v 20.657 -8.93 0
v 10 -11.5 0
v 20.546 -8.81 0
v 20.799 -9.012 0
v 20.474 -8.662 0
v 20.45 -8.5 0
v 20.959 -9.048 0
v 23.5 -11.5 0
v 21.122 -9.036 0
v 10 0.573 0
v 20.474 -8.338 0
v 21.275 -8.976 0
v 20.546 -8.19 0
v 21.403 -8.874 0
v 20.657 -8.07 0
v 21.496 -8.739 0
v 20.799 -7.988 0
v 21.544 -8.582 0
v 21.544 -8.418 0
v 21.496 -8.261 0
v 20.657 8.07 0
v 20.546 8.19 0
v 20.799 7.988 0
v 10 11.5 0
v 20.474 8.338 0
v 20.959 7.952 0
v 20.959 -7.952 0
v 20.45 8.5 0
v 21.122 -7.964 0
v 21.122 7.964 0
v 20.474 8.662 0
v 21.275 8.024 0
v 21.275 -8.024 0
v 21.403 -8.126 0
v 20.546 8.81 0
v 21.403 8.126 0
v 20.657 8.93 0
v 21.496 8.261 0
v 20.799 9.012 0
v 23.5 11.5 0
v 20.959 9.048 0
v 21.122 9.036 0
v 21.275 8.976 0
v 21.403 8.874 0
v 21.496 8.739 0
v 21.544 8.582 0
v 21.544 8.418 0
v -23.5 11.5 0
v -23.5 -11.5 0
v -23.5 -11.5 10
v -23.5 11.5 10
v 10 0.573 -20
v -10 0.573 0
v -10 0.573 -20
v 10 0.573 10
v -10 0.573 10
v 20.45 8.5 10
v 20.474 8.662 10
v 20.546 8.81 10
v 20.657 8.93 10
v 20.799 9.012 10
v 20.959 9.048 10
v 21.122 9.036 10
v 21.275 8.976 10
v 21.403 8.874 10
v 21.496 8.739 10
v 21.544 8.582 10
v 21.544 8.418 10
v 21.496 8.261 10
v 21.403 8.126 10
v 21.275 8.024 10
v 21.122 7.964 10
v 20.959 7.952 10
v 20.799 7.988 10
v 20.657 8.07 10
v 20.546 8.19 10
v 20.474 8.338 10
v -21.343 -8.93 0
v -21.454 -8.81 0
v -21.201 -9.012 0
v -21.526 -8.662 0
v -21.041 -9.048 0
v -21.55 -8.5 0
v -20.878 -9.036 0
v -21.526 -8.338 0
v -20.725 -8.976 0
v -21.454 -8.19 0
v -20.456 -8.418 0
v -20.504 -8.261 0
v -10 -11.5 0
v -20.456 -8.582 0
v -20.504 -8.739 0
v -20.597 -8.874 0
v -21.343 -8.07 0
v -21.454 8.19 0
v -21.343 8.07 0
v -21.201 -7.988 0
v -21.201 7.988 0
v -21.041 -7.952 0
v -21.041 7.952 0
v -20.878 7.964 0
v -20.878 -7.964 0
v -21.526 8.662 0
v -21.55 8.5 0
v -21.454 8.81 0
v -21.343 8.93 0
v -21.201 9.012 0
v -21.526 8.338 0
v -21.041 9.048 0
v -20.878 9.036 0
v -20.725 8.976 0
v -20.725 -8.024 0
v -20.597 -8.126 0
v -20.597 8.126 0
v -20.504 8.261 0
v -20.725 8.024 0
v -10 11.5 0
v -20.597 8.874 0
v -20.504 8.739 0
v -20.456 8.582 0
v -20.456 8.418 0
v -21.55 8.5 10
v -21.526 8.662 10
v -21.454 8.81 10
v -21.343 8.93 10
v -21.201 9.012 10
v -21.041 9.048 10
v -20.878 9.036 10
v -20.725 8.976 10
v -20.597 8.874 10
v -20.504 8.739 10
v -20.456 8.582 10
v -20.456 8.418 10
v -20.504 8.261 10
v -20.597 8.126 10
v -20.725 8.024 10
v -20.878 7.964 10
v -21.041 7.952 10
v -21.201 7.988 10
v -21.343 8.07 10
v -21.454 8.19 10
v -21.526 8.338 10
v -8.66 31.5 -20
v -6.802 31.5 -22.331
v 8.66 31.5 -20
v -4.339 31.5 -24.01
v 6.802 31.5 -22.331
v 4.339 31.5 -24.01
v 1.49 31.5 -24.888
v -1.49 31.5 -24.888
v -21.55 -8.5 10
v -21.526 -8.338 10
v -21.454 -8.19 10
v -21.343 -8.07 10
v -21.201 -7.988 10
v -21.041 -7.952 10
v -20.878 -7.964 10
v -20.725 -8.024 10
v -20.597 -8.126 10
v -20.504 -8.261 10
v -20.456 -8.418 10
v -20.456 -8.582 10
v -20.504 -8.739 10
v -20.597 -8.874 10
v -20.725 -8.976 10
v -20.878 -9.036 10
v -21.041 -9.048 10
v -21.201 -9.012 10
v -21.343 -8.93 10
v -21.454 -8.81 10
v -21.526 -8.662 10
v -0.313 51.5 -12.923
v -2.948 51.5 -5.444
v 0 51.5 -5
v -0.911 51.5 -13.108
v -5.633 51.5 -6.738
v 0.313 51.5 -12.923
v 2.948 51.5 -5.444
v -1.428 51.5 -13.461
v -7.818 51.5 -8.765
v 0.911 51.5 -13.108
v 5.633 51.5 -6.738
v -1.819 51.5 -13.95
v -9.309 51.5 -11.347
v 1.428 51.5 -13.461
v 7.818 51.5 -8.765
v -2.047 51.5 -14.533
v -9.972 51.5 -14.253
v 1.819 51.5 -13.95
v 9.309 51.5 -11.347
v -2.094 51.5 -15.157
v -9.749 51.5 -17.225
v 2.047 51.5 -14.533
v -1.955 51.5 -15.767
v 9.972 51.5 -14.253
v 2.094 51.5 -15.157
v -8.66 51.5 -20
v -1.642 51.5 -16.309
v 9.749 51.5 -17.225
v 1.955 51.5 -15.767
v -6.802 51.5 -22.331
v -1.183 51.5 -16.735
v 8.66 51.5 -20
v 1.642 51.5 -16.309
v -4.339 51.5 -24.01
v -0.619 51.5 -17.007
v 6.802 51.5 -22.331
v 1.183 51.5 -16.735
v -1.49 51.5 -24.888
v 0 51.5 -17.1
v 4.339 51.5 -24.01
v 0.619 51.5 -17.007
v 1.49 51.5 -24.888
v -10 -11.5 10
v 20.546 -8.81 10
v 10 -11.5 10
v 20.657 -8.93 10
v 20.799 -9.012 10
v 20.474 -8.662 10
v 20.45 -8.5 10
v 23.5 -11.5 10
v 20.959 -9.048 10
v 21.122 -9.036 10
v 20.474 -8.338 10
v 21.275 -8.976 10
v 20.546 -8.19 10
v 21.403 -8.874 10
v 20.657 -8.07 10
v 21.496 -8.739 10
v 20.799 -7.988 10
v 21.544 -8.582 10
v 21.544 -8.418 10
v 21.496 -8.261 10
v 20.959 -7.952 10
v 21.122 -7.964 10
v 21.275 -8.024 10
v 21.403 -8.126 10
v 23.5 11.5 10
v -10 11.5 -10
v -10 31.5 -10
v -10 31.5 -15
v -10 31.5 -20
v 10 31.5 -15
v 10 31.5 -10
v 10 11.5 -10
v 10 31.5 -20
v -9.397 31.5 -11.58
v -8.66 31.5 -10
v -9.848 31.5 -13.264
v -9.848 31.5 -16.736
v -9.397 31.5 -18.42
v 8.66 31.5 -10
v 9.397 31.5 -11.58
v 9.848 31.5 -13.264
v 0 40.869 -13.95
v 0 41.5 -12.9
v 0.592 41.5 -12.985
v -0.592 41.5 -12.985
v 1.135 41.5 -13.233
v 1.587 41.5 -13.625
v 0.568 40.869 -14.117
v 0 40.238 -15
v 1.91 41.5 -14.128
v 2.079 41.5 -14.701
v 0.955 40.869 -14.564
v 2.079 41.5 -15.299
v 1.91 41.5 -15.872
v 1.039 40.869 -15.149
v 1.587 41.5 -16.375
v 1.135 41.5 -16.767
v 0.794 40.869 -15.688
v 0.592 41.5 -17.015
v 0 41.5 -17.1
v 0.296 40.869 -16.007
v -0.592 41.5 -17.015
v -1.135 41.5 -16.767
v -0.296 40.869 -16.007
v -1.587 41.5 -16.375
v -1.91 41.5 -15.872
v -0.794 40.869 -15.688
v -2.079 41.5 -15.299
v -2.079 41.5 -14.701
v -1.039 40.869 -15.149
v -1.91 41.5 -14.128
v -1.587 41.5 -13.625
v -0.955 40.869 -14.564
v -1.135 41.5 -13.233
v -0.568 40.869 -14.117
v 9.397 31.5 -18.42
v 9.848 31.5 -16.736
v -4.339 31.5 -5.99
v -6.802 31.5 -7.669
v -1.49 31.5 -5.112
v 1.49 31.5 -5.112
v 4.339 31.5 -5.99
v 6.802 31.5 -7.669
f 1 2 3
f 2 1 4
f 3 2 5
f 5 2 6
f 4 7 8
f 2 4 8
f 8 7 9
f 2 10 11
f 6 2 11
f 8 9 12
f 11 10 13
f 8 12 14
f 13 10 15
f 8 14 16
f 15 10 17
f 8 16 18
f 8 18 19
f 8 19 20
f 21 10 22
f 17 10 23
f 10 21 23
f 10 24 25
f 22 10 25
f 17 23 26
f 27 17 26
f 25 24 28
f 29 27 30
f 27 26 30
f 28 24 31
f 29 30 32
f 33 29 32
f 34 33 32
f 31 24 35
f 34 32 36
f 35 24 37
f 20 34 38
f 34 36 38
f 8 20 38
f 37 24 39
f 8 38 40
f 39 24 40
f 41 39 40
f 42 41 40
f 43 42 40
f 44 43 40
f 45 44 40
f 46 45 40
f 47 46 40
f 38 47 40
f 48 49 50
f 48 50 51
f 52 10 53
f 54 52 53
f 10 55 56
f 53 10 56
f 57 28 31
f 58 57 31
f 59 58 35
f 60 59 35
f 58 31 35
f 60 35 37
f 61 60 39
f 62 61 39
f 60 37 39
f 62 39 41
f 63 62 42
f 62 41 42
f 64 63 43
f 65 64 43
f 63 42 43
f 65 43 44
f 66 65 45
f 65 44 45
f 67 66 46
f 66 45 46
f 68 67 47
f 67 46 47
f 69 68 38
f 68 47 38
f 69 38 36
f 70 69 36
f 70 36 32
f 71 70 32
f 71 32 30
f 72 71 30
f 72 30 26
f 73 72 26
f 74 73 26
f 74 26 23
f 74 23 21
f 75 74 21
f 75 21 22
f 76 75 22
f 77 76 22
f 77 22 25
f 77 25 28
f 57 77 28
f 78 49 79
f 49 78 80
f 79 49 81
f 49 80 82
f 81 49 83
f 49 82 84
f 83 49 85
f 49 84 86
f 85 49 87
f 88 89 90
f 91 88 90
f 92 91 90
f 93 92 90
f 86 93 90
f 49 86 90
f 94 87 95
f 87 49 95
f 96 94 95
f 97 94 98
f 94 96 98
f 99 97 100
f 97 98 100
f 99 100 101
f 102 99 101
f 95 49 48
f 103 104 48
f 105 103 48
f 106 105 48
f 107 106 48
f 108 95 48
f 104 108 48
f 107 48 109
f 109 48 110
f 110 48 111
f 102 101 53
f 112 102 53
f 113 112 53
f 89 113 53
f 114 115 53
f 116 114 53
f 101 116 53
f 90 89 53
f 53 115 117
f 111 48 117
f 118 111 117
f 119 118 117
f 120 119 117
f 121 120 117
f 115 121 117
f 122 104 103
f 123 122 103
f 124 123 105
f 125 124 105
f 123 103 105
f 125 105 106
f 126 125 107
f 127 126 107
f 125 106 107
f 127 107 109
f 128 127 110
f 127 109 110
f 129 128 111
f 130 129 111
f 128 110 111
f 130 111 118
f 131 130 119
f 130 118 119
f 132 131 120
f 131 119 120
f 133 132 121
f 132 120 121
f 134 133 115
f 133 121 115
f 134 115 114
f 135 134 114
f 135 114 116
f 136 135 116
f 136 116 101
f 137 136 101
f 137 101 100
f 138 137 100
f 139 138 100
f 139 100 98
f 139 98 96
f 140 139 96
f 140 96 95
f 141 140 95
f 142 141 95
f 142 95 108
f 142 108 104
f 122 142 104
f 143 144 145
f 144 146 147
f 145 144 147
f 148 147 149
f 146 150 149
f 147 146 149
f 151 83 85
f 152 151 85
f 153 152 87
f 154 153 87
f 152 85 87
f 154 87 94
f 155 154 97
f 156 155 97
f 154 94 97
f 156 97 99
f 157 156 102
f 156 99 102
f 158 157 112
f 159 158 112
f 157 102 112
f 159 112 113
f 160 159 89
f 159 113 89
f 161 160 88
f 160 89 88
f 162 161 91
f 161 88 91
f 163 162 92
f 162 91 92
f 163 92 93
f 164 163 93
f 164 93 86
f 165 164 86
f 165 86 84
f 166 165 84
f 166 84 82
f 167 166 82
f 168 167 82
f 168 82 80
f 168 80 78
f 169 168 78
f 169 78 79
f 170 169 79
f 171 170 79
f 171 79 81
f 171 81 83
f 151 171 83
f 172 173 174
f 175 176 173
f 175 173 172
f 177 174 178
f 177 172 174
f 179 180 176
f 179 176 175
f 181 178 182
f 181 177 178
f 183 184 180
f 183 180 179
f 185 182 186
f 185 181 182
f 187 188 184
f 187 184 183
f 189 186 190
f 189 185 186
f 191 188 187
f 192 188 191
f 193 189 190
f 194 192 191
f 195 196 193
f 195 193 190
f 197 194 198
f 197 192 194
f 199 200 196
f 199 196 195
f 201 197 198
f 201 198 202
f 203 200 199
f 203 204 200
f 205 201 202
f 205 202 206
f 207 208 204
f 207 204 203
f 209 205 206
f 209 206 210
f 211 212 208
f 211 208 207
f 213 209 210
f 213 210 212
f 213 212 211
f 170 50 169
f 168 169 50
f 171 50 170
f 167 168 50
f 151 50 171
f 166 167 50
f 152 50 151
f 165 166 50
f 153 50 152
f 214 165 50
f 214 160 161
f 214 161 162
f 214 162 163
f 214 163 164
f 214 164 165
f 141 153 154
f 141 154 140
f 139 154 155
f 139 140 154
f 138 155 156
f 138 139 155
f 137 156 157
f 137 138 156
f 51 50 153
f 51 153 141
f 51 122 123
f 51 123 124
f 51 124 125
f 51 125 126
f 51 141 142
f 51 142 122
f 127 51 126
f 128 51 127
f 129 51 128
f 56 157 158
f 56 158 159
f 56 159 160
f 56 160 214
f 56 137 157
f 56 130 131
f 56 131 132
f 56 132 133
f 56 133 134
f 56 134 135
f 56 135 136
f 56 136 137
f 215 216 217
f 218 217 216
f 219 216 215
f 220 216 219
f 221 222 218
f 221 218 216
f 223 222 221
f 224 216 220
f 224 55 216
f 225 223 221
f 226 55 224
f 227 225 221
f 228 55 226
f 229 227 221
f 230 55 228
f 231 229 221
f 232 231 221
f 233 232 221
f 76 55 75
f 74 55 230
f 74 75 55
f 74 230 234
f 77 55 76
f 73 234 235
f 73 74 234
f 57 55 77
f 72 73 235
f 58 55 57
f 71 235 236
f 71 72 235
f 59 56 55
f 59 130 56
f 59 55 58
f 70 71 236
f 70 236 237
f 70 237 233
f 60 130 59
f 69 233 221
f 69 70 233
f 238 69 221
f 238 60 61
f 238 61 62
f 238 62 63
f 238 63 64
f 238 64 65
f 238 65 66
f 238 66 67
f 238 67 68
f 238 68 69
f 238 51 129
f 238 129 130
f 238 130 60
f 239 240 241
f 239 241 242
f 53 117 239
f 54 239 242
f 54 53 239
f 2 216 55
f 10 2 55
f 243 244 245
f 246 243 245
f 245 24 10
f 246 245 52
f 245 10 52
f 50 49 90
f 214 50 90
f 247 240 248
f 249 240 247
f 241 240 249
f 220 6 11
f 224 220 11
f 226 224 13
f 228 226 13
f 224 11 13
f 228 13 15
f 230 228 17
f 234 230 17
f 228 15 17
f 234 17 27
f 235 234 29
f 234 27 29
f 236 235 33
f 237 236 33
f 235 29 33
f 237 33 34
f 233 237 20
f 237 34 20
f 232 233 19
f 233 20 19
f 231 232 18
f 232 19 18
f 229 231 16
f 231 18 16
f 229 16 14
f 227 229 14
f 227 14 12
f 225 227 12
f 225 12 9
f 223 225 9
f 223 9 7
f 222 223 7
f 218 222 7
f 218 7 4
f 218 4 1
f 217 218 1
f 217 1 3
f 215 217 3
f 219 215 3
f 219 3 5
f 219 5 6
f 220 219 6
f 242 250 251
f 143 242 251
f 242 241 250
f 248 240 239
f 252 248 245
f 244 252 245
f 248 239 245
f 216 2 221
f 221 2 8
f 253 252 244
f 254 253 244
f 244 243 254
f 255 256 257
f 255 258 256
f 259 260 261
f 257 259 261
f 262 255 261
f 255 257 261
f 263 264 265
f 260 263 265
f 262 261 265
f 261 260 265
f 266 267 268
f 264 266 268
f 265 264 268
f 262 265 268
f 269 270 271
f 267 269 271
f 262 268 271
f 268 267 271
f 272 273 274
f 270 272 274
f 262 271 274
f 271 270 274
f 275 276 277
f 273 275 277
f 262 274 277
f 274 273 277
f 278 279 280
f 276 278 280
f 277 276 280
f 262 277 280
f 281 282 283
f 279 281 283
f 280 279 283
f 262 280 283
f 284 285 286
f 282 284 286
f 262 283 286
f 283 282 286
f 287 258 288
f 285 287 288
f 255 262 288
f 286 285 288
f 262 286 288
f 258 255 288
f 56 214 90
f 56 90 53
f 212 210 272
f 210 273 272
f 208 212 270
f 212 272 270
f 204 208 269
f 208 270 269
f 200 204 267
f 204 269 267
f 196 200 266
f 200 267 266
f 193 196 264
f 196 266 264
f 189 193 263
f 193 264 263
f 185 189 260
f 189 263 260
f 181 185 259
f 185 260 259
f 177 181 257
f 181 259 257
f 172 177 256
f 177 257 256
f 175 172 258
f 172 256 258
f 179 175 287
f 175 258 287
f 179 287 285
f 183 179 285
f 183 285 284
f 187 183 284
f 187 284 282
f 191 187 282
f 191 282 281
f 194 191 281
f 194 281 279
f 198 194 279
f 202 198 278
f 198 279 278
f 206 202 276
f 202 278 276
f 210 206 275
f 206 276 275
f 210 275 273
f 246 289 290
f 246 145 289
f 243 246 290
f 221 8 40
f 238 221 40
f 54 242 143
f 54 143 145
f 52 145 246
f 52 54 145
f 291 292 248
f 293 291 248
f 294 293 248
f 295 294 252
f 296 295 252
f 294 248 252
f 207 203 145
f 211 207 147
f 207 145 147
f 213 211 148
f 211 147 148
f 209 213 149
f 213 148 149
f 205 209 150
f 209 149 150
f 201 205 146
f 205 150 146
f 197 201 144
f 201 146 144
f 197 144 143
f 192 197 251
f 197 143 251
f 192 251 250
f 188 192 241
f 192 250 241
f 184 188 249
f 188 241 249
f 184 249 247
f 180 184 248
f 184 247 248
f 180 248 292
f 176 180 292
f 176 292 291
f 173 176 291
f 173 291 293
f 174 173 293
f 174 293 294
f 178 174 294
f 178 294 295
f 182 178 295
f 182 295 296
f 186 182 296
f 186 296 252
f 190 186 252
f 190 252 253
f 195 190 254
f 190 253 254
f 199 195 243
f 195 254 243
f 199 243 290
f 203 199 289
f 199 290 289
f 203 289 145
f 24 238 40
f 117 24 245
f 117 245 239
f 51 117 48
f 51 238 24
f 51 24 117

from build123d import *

# Parameters (mm, degrees)
ESQUISSE1_W               = 47
ESQUISSE1_H               = 23
BOSS_EXTRU_1_DEPTH        = 10
TROU_TARAUD_M1_4X0_32_D   = 1.1
ESQUISSE5_W               = 20
ESQUISSE5_H               = 15
ENL_V_MAT_EXTRU_1_DEPTH   = 10
ESQUISSE6_W               = 20
ESQUISSE6_H               = 10.927419914
BOSS_EXTRU_2_DEPTH        = 20
ESQUISSE9_W               = 20
ESQUISSE9_H               = 10
BOSS_EXTRU_5_DEPTH        = 20
ESQUISSE10_R              = 10
BOSS_EXTRU_6_DEPTH        = 20
TROU_TARAUD_M5X0_81_D     = 4.2
TROU_TARAUD_M5X0_81_DEPTH = 10
TROU_TARAUD_M5X0_81_TIP   = 1.2618073


with BuildPart() as part:
    # Esquisse1 → Boss.-Extru.1 (new body)
    with BuildSketch(Plane.XY):
        Rectangle(ESQUISSE1_W, ESQUISSE1_H)
    extrude(amount=BOSS_EXTRU_1_DEPTH)

    # Trou taraudé M1.4x0.32 (through all)
    with Locations(Plane(origin=(-21, 8.5, 10), x_dir=(1, 0, 0), z_dir=(0, 0, 1))):
        with Locations((0, 0), (0, -17), (42, -17), (42, 0)):
            Hole(TROU_TARAUD_M1_4X0_32_D / 2)

    # Esquisse5 → Enlèv. mat.-Extru.1 (cut)
    with BuildSketch(Plane.XY.offset(10)):
        with Locations((0, -6.927419914)):
            Rectangle(ESQUISSE5_W, ESQUISSE5_H)
    extrude(amount=-ENL_V_MAT_EXTRU_1_DEPTH, mode=Mode.SUBTRACT)

    # Esquisse6 → Boss.-Extru.2 (add)
    with BuildSketch(Plane(origin=(0, 0, 0), x_dir=(-1, 0, 0), z_dir=(0, 0, -1))):
        with Locations((0, 6.036290043)):
            Rectangle(ESQUISSE6_W, ESQUISSE6_H)
    extrude(amount=BOSS_EXTRU_2_DEPTH)

    # Esquisse9 → Boss.-Extru.5 (add)
    with BuildSketch(Plane(origin=(0, 11.5, 0), x_dir=(1, 0, 0), z_dir=(0, 1, 0))):
        with Locations((0, 15)):
            Rectangle(ESQUISSE9_W, ESQUISSE9_H)
    extrude(amount=BOSS_EXTRU_5_DEPTH)

    # Esquisse10 → Boss.-Extru.6 (add)
    with BuildSketch(Plane(origin=(0, 31.5, 0), x_dir=(1, 0, 0), z_dir=(0, 1, 0))):
        with Locations(Location((0, 15, 0), (0, 0, 30))):
            Circle(ESQUISSE10_R)
    extrude(amount=BOSS_EXTRU_6_DEPTH)

    # Trou taraudé M5x0.81
    with Locations(Plane(origin=(0, 51.5, -15), x_dir=(0, 0, 1), z_dir=(0, 1, 0))):
        with Locations((0, 0)):
            Hole(TROU_TARAUD_M5X0_81_D / 2, depth=TROU_TARAUD_M5X0_81_DEPTH)
            with Locations((0, 0, -(TROU_TARAUD_M5X0_81_DEPTH + TROU_TARAUD_M5X0_81_TIP / 2))):  # 118° drill point
                Cone(0, TROU_TARAUD_M5X0_81_D / 2, TROU_TARAUD_M5X0_81_TIP, mode=Mode.SUBTRACT)


solid = part.part
